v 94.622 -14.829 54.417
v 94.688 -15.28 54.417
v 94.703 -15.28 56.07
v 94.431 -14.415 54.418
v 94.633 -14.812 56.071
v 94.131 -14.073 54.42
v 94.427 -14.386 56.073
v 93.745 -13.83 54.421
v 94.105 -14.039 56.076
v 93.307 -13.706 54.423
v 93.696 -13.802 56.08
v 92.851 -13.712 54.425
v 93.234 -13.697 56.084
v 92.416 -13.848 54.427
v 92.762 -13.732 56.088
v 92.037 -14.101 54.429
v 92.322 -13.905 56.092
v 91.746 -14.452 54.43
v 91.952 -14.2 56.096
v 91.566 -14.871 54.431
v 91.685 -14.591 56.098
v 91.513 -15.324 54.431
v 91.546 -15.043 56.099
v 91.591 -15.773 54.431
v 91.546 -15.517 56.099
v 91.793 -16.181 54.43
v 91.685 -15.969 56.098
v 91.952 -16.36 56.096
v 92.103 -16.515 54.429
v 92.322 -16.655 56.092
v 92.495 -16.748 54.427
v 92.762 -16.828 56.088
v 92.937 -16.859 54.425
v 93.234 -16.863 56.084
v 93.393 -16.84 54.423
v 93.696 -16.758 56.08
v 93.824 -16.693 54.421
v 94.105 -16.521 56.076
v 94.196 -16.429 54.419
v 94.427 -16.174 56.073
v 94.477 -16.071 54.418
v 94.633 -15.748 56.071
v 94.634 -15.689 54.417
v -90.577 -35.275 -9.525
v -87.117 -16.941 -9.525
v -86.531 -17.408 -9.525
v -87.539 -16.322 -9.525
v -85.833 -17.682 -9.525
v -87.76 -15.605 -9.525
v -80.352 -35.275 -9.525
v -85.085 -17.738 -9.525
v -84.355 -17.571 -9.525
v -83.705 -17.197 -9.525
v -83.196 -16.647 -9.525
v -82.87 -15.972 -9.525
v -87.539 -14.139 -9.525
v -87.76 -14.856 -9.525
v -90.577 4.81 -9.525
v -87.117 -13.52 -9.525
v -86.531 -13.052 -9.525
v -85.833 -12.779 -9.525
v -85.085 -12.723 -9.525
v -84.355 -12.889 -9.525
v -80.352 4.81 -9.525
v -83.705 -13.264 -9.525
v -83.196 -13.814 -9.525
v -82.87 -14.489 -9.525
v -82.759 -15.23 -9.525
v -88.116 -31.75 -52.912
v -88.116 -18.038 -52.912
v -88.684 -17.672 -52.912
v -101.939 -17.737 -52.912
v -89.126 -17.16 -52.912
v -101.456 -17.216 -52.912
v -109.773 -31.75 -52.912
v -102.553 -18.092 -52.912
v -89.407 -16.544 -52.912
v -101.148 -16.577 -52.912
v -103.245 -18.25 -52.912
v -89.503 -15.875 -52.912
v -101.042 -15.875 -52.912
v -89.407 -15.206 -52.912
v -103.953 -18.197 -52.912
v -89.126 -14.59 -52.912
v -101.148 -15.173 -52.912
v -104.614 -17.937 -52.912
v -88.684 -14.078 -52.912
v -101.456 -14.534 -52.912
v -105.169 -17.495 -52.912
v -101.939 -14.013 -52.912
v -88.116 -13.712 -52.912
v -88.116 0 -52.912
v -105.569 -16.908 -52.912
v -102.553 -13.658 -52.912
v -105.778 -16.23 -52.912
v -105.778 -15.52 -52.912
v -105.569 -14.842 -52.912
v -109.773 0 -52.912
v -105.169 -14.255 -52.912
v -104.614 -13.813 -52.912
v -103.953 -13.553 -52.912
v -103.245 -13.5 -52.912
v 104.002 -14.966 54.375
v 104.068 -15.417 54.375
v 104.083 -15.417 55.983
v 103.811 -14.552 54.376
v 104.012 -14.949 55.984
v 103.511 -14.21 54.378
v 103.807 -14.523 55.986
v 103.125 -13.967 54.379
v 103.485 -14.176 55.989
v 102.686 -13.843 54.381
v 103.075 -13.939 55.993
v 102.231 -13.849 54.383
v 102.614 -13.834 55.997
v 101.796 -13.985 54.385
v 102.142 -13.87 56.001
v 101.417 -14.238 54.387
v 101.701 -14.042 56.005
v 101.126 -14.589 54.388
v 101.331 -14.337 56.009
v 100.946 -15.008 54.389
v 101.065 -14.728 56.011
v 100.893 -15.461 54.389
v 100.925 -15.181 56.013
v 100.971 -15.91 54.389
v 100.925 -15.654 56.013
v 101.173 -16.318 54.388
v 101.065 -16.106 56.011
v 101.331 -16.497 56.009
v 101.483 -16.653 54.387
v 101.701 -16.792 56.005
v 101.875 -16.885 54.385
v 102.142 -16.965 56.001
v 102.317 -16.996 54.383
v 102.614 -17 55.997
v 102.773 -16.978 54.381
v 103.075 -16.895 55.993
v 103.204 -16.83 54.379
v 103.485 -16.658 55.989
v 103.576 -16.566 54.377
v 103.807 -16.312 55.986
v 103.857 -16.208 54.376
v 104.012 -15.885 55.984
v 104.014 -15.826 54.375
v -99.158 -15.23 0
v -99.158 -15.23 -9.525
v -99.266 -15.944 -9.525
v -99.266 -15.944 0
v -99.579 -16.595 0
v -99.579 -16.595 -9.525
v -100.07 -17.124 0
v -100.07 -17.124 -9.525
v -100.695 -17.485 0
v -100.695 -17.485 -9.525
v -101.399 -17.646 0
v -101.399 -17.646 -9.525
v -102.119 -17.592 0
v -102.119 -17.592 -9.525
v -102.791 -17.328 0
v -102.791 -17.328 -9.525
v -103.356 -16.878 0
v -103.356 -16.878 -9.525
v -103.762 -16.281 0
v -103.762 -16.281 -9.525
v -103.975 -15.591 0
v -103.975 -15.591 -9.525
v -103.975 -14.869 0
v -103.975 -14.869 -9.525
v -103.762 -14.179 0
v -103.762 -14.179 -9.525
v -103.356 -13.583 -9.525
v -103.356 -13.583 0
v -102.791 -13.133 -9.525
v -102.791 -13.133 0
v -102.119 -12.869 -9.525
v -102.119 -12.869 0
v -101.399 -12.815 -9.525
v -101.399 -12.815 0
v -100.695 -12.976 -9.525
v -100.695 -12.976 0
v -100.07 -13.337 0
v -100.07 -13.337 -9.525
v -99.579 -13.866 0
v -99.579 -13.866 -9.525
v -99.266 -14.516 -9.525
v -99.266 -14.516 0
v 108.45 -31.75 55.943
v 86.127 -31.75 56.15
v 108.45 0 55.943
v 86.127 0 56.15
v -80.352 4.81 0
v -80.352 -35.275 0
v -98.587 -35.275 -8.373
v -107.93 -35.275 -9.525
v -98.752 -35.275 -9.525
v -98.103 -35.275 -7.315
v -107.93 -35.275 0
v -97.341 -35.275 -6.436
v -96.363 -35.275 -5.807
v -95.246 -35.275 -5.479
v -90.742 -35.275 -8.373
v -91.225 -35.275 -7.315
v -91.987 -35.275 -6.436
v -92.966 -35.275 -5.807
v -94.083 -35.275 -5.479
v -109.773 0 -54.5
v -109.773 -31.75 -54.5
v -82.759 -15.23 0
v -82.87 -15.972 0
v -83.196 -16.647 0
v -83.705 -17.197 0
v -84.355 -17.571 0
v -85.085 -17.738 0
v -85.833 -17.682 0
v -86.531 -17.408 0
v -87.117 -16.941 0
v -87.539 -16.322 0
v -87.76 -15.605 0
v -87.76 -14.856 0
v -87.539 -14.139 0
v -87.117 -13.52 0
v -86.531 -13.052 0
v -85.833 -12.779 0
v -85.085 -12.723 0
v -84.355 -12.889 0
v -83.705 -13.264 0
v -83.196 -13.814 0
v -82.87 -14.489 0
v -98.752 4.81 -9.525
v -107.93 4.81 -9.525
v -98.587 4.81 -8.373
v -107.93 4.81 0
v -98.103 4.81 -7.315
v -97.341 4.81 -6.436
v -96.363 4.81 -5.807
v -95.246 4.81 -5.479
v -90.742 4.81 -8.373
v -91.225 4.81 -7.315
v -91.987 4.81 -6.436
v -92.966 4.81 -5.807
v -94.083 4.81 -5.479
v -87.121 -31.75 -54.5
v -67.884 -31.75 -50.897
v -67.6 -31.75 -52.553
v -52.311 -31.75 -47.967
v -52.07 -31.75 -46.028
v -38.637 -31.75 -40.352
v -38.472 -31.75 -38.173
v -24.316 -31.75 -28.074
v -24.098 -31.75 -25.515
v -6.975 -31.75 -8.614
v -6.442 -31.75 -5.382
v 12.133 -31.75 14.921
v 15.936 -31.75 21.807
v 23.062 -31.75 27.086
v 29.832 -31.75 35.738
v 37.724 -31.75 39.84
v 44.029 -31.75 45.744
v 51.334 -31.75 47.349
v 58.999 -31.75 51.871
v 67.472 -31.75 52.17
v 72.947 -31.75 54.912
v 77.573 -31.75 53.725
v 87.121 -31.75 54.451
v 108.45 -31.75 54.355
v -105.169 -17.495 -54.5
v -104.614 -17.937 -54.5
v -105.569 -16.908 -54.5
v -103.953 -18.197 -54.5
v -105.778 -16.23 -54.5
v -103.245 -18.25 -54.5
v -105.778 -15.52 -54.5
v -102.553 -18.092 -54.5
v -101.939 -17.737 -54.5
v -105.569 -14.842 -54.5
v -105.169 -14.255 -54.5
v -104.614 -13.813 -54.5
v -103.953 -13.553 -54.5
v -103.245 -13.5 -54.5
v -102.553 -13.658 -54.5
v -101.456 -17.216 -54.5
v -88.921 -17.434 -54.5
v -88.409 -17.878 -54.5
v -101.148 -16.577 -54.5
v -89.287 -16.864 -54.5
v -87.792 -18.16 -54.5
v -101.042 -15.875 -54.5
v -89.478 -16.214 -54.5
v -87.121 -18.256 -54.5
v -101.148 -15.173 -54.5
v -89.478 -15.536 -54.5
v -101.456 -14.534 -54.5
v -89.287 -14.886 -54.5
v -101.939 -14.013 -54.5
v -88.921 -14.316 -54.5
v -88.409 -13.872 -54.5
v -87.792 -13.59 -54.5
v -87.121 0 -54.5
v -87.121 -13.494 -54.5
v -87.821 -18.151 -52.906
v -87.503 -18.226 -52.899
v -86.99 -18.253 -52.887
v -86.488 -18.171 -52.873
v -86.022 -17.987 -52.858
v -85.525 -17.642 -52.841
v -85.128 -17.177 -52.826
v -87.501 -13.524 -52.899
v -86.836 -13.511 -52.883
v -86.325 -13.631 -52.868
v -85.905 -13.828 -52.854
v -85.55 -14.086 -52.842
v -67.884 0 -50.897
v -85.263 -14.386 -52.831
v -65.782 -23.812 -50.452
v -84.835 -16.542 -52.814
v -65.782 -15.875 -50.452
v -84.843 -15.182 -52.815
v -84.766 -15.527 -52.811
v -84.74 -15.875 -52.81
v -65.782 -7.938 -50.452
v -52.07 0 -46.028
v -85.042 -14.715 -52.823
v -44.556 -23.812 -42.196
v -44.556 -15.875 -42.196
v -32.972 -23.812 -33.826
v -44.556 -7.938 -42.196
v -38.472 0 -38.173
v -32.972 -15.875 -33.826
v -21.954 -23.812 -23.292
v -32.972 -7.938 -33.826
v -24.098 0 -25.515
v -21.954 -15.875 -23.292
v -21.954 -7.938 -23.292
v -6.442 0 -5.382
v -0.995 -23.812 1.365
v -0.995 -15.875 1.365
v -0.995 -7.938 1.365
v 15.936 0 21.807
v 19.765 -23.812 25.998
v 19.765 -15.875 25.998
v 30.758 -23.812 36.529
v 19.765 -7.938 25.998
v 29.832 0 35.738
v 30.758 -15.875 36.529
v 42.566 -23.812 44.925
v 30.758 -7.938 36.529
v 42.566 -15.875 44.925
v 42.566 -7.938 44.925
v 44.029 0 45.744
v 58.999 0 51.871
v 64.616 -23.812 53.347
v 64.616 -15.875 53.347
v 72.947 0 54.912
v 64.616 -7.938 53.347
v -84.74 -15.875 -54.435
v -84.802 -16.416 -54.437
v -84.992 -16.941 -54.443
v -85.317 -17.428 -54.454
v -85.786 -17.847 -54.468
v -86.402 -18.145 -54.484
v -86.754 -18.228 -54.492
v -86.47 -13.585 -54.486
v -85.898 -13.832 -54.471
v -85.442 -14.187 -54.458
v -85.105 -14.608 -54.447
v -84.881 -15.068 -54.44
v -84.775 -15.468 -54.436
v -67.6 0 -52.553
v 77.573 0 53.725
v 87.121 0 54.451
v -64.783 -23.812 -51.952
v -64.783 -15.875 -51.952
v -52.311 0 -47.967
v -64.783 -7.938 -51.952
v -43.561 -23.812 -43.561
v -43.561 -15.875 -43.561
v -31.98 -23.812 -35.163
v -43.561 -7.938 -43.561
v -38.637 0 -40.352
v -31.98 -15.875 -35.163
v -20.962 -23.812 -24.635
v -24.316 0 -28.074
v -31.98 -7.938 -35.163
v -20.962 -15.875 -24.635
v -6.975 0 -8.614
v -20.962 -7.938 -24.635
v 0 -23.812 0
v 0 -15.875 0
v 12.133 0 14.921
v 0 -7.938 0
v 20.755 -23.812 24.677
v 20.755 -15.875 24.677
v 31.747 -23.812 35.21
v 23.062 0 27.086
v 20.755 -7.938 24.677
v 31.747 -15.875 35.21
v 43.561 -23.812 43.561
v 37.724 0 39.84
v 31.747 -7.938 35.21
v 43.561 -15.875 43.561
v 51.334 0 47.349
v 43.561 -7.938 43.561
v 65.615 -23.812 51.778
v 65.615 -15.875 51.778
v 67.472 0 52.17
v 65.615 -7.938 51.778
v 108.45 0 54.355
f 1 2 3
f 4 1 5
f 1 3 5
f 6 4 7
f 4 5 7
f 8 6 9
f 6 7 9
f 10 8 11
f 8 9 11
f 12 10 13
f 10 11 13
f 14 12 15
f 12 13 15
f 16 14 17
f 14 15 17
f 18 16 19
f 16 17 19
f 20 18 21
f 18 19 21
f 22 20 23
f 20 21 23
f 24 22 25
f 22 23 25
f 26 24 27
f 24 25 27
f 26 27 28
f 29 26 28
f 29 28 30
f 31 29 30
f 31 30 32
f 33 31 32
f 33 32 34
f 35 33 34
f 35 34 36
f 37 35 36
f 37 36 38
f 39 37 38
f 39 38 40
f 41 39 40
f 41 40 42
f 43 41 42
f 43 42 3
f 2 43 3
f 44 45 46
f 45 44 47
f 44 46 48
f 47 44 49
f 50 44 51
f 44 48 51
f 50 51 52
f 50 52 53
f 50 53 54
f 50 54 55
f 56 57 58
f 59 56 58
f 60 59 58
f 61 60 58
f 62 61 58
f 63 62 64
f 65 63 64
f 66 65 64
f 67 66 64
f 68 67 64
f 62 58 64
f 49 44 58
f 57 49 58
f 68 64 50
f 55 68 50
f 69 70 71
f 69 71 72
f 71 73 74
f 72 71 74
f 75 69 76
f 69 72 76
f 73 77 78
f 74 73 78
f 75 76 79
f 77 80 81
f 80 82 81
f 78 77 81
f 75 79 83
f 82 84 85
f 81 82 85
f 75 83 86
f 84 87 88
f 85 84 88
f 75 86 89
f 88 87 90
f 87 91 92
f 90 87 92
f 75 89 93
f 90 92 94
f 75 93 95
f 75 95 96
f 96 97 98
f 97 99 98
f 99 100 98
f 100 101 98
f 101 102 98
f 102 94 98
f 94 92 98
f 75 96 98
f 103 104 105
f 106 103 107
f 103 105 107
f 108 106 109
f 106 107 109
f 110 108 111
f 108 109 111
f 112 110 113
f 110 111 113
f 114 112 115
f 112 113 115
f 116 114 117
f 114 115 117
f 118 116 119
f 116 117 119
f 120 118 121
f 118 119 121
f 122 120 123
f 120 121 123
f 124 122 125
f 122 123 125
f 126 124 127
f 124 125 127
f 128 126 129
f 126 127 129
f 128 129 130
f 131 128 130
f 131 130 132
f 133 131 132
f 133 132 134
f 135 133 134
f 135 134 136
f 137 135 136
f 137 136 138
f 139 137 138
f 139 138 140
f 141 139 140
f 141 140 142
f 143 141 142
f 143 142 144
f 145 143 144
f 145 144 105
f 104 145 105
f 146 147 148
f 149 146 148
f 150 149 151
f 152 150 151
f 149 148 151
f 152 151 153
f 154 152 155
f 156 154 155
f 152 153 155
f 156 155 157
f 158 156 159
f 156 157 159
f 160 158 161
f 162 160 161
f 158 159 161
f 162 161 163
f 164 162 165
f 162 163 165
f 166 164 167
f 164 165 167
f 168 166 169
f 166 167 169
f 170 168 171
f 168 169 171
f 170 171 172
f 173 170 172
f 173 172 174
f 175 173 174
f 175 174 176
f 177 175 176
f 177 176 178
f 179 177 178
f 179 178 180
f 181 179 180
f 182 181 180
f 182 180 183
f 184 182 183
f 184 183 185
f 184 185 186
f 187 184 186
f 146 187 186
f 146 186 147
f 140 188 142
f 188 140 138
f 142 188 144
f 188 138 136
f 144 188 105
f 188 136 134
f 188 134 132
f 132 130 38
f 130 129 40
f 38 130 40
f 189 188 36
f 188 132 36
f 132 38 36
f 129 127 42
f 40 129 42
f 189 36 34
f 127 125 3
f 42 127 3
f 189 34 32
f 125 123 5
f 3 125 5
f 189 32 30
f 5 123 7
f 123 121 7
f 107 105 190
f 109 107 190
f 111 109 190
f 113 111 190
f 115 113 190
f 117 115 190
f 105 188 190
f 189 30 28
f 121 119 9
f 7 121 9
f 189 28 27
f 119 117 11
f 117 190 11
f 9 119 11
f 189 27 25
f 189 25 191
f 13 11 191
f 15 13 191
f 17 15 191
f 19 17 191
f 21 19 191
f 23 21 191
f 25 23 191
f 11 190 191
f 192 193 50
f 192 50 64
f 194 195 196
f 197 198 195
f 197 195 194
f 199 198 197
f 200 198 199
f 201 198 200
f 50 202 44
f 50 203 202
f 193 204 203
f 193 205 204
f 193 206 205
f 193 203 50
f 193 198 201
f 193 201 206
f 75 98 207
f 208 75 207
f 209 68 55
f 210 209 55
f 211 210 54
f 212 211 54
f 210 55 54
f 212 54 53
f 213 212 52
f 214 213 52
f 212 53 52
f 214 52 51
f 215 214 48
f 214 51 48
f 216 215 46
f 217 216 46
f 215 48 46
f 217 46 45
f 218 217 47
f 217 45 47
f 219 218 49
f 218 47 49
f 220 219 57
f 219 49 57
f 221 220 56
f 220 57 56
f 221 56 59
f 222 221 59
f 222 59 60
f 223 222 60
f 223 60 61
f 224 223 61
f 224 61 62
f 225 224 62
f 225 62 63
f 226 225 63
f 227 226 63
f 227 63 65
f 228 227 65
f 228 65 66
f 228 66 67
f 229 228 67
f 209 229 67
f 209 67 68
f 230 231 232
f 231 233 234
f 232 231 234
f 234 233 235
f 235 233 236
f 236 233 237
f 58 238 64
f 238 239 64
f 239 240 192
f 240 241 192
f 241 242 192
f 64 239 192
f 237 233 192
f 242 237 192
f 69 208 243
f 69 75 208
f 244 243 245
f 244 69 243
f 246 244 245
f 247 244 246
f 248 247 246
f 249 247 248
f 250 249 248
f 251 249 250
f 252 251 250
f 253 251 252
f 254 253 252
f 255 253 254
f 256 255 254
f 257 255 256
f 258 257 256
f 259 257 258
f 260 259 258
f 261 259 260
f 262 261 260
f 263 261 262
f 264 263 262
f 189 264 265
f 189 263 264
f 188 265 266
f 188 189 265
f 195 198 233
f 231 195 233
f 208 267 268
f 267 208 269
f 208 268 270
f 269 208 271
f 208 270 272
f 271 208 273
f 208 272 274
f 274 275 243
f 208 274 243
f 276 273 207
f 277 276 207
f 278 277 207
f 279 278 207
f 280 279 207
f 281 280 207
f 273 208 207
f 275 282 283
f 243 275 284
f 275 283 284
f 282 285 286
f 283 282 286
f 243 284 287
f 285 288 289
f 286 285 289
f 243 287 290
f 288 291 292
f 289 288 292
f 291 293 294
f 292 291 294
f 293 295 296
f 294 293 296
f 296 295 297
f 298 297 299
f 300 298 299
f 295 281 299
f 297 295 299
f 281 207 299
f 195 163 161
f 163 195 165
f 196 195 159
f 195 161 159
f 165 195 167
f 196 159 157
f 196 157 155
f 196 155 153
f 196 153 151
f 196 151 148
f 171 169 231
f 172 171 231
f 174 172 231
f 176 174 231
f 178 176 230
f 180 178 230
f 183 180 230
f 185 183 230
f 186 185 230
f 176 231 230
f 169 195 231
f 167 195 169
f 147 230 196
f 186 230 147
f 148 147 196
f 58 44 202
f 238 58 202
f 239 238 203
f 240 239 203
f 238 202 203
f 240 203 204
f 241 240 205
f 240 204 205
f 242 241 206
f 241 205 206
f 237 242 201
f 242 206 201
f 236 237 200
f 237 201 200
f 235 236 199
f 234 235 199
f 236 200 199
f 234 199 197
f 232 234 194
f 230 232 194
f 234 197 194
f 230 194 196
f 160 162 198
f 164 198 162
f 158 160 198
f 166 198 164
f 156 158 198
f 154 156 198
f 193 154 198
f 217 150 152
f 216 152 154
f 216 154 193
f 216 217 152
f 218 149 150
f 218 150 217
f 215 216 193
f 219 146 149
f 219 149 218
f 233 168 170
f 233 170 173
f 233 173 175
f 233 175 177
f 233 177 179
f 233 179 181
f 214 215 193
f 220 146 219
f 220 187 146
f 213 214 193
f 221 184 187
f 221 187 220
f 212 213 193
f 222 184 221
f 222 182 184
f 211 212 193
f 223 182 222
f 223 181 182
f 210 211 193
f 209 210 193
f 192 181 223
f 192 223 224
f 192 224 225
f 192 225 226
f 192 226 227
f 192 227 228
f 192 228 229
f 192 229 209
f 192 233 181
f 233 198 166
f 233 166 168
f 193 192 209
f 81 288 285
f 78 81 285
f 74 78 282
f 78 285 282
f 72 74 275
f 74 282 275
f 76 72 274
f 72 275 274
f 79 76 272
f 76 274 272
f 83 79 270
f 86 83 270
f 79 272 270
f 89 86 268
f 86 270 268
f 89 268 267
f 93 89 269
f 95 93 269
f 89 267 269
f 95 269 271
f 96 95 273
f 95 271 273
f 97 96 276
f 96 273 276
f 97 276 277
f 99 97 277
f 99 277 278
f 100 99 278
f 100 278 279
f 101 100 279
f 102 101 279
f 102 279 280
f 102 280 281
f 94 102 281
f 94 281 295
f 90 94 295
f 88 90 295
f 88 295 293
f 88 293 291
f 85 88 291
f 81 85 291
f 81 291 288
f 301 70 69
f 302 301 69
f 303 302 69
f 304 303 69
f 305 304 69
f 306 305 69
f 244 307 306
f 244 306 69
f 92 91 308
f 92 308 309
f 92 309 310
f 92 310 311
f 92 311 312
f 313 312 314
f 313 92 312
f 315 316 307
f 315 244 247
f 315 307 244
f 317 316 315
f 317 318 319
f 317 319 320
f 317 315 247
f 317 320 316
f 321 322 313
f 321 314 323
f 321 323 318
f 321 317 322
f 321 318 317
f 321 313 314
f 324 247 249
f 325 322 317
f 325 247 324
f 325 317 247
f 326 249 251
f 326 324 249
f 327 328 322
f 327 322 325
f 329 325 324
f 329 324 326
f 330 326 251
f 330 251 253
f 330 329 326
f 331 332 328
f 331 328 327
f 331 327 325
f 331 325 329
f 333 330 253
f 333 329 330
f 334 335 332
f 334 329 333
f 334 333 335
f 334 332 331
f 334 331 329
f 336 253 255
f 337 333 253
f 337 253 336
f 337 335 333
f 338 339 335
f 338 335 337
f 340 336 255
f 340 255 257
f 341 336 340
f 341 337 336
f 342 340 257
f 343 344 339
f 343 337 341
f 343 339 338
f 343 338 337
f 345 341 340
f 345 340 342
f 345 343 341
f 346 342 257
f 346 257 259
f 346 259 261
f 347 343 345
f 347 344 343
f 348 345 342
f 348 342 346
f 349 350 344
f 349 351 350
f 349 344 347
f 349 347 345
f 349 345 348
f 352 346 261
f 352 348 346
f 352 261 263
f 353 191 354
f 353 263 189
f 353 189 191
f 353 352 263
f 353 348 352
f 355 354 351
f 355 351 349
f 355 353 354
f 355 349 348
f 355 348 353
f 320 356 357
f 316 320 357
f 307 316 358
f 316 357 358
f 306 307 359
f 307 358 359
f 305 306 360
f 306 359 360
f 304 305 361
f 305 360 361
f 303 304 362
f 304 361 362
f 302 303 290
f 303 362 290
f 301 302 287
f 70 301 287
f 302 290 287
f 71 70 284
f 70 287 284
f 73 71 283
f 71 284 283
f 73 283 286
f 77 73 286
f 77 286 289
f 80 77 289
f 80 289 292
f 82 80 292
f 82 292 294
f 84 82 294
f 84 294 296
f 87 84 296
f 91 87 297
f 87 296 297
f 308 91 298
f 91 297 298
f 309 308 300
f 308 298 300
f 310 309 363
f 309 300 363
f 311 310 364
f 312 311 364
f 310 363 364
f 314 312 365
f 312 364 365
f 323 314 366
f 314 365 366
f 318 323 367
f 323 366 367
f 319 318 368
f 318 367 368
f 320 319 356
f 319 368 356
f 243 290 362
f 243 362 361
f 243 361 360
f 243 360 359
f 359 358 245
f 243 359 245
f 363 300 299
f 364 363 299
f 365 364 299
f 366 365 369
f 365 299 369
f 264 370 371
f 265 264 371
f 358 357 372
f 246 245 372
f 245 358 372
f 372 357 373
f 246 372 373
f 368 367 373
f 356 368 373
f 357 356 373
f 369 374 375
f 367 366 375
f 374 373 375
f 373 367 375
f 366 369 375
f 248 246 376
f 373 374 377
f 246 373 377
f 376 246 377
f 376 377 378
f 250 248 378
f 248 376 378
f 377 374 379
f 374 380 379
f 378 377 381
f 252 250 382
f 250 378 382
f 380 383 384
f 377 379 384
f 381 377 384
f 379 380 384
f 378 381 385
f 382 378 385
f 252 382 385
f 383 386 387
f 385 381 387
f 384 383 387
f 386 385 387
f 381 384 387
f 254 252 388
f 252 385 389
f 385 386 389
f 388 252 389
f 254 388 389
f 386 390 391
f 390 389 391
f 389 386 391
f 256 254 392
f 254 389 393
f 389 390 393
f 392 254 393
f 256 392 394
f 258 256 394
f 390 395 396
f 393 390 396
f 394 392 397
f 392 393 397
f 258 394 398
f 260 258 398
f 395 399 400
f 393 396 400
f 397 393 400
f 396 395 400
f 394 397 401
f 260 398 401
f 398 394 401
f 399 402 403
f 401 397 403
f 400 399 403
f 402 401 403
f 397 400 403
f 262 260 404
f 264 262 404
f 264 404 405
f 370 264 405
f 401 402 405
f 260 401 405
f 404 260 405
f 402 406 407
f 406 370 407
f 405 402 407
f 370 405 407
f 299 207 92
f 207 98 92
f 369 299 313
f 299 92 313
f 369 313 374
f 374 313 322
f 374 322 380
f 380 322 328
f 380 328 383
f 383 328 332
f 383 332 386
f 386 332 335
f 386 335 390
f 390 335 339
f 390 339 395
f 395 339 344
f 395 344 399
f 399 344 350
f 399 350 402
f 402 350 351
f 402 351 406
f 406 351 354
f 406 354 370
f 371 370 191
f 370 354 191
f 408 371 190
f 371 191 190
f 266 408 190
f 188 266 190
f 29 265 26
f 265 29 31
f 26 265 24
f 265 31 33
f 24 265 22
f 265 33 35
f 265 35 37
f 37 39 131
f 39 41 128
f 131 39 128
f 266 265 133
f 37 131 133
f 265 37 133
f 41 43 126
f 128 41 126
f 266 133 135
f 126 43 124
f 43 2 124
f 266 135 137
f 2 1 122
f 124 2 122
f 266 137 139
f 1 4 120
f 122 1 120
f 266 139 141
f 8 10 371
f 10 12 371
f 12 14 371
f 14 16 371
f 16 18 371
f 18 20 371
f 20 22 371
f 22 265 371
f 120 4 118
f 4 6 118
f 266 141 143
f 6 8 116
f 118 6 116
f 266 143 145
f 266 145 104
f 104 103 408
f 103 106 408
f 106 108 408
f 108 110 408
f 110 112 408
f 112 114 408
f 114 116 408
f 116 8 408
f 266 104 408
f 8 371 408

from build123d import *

# Parameters (mm, degrees)
F2_DEPTH  = 31.75
F3_R      = 1.5875
F4_DEPTH  = 2.54
F5_R      = 2.38125
F6_DEPTH  = 2.54
F7_W      = 27.578599751
F7_H      = 40.0851694867
F8_DEPTH  = 9.525
F9_R      = 2.4220384901
F9_R_2    = 2.5148035407
F10_DEPTH = 25.4
F12_DEPTH = 50.8


# Not quite as in the source:
# - the program builds the solid bodies; features that only make, move or delete a surface that nothing else refers to are left out


with BuildPart() as f2:
    # F0 (on Front) → F2 (new body)
    with BuildSketch(Plane.XZ):
        with BuildLine():
            Line((-109.7734197974, -54.4999252498), (-87.1213535286, -54.4999252498))
            add(Edge.make_bspline(
                [(-87.1213535286, -54.4999252498), (-72.0730019908, -54.2105347145), (-39.612358699, -48.6311111585), (0.2764524513, -0.055323172), (38.5858327695, 48.8342903772), (73.8190934908, 53.859632643), (87.1213535286, 54.4508459553)],
                knots=[0, 0, 0, 0, 0.230298298, 0.5000152925, 0.7697322871, 1, 1, 1, 1], degree=3))
            Line((87.1213535286, 54.4508459553), (108.4502488375, 54.3554909527))
            Line((108.4502488375, 54.3554909527), (108.4502488375, 55.9429909527))
            Line((108.4502488375, 55.9429909527), (86.1265237905, 56.1496154059))
            add(Edge.make_bspline(
                [(-88.1161832666, -52.9124252498), (-73.0779283777, -52.6232288803), (-40.5831653258, -47.3903123555), (-0.7292490562, 1.3961196705), (37.624911948, 50.0240186994), (72.8130684815, 55.5579045244), (86.1265237905, 56.1496154059)],
                knots=[0, 0, 0, 0, 0.23014378, 0.4998411361, 0.7695384922, 1, 1, 1, 1], degree=3))
            Line((-88.1161832666, -52.9124252498), (-109.7734197974, -52.9124252498))
            Line((-109.7734197974, -52.9124252498), (-109.7734197974, -54.4999252498))
        make_face()
    extrude(amount=F2_DEPTH)

    # F3 (on face) → F4 (cut)
    with BuildSketch(Plane(origin=(0.5270442453, 0, 56.9419090581), x_dir=(0.9999571676, 0, -0.0092554268), z_dir=(0.0092554268, 0, 0.9999571676))):
        with Locations((92.5925821066, -15.2800846845)):
            Circle(F3_R)
        with Locations((101.9724830985, -15.4172424227)):
            Circle(F3_R)
    extrude(amount=-F4_DEPTH, mode=Mode.SUBTRACT)

    # F5 (on face) → F6 (cut)
    with BuildSketch(Plane(origin=(0, 0, -54.4999252498), x_dir=(1, 0, 0), z_dir=(0, 0, -1))):
        with Locations((-103.4234197974, 15.875)):
            Circle(F5_R)
        with Locations((-87.1213535286, 15.875)):
            Circle(F5_R)
    extrude(amount=-F6_DEPTH, mode=Mode.SUBTRACT)


with BuildPart() as f8:
    # F7 (on Top) → F8 (new body)
    with BuildSketch(Plane.XY):
        with Locations((-94.1408313811, -15.2323641814)):
            Rectangle(F7_W, F7_H)
    extrude(amount=-F8_DEPTH)

    # F9 (on face) → F10 (cut)
    with BuildSketch(Plane(origin=(0, 0, -9.525), x_dir=(1, 0, 0), z_dir=(0, 0, -1))):
        with Locations((-101.5801312566, 15.2303794381)):
            Circle(F9_R)
        with Locations((-85.2733312566, 15.2303794381)):
            Circle(F9_R_2)
    extrude(amount=-F10_DEPTH, mode=Mode.SUBTRACT)

    # F11 (on face) → F12 (cut)
    with BuildSketch(Plane.XZ.offset(35.2749489248)):
        with BuildLine():
            Line((-98.7523206457, -9.525), (-90.5765137688, -9.525))
            ThreePointArc((-90.5765137688, -9.525), (-94.6644172072, -5.4370965615), (-98.7523206457, -9.525))
        make_face()
        with BuildLine():
            ThreePointArc((-98.7523206457, -9.525), (-94.6644172072, -13.6129034385), (-90.5765137688, -9.525))
            Line((-90.5765137688, -9.525), (-98.7523206457, -9.525))
        make_face()
    extrude(amount=-F12_DEPTH, mode=Mode.SUBTRACT)


solid = Compound([f2.part, f8.part])
